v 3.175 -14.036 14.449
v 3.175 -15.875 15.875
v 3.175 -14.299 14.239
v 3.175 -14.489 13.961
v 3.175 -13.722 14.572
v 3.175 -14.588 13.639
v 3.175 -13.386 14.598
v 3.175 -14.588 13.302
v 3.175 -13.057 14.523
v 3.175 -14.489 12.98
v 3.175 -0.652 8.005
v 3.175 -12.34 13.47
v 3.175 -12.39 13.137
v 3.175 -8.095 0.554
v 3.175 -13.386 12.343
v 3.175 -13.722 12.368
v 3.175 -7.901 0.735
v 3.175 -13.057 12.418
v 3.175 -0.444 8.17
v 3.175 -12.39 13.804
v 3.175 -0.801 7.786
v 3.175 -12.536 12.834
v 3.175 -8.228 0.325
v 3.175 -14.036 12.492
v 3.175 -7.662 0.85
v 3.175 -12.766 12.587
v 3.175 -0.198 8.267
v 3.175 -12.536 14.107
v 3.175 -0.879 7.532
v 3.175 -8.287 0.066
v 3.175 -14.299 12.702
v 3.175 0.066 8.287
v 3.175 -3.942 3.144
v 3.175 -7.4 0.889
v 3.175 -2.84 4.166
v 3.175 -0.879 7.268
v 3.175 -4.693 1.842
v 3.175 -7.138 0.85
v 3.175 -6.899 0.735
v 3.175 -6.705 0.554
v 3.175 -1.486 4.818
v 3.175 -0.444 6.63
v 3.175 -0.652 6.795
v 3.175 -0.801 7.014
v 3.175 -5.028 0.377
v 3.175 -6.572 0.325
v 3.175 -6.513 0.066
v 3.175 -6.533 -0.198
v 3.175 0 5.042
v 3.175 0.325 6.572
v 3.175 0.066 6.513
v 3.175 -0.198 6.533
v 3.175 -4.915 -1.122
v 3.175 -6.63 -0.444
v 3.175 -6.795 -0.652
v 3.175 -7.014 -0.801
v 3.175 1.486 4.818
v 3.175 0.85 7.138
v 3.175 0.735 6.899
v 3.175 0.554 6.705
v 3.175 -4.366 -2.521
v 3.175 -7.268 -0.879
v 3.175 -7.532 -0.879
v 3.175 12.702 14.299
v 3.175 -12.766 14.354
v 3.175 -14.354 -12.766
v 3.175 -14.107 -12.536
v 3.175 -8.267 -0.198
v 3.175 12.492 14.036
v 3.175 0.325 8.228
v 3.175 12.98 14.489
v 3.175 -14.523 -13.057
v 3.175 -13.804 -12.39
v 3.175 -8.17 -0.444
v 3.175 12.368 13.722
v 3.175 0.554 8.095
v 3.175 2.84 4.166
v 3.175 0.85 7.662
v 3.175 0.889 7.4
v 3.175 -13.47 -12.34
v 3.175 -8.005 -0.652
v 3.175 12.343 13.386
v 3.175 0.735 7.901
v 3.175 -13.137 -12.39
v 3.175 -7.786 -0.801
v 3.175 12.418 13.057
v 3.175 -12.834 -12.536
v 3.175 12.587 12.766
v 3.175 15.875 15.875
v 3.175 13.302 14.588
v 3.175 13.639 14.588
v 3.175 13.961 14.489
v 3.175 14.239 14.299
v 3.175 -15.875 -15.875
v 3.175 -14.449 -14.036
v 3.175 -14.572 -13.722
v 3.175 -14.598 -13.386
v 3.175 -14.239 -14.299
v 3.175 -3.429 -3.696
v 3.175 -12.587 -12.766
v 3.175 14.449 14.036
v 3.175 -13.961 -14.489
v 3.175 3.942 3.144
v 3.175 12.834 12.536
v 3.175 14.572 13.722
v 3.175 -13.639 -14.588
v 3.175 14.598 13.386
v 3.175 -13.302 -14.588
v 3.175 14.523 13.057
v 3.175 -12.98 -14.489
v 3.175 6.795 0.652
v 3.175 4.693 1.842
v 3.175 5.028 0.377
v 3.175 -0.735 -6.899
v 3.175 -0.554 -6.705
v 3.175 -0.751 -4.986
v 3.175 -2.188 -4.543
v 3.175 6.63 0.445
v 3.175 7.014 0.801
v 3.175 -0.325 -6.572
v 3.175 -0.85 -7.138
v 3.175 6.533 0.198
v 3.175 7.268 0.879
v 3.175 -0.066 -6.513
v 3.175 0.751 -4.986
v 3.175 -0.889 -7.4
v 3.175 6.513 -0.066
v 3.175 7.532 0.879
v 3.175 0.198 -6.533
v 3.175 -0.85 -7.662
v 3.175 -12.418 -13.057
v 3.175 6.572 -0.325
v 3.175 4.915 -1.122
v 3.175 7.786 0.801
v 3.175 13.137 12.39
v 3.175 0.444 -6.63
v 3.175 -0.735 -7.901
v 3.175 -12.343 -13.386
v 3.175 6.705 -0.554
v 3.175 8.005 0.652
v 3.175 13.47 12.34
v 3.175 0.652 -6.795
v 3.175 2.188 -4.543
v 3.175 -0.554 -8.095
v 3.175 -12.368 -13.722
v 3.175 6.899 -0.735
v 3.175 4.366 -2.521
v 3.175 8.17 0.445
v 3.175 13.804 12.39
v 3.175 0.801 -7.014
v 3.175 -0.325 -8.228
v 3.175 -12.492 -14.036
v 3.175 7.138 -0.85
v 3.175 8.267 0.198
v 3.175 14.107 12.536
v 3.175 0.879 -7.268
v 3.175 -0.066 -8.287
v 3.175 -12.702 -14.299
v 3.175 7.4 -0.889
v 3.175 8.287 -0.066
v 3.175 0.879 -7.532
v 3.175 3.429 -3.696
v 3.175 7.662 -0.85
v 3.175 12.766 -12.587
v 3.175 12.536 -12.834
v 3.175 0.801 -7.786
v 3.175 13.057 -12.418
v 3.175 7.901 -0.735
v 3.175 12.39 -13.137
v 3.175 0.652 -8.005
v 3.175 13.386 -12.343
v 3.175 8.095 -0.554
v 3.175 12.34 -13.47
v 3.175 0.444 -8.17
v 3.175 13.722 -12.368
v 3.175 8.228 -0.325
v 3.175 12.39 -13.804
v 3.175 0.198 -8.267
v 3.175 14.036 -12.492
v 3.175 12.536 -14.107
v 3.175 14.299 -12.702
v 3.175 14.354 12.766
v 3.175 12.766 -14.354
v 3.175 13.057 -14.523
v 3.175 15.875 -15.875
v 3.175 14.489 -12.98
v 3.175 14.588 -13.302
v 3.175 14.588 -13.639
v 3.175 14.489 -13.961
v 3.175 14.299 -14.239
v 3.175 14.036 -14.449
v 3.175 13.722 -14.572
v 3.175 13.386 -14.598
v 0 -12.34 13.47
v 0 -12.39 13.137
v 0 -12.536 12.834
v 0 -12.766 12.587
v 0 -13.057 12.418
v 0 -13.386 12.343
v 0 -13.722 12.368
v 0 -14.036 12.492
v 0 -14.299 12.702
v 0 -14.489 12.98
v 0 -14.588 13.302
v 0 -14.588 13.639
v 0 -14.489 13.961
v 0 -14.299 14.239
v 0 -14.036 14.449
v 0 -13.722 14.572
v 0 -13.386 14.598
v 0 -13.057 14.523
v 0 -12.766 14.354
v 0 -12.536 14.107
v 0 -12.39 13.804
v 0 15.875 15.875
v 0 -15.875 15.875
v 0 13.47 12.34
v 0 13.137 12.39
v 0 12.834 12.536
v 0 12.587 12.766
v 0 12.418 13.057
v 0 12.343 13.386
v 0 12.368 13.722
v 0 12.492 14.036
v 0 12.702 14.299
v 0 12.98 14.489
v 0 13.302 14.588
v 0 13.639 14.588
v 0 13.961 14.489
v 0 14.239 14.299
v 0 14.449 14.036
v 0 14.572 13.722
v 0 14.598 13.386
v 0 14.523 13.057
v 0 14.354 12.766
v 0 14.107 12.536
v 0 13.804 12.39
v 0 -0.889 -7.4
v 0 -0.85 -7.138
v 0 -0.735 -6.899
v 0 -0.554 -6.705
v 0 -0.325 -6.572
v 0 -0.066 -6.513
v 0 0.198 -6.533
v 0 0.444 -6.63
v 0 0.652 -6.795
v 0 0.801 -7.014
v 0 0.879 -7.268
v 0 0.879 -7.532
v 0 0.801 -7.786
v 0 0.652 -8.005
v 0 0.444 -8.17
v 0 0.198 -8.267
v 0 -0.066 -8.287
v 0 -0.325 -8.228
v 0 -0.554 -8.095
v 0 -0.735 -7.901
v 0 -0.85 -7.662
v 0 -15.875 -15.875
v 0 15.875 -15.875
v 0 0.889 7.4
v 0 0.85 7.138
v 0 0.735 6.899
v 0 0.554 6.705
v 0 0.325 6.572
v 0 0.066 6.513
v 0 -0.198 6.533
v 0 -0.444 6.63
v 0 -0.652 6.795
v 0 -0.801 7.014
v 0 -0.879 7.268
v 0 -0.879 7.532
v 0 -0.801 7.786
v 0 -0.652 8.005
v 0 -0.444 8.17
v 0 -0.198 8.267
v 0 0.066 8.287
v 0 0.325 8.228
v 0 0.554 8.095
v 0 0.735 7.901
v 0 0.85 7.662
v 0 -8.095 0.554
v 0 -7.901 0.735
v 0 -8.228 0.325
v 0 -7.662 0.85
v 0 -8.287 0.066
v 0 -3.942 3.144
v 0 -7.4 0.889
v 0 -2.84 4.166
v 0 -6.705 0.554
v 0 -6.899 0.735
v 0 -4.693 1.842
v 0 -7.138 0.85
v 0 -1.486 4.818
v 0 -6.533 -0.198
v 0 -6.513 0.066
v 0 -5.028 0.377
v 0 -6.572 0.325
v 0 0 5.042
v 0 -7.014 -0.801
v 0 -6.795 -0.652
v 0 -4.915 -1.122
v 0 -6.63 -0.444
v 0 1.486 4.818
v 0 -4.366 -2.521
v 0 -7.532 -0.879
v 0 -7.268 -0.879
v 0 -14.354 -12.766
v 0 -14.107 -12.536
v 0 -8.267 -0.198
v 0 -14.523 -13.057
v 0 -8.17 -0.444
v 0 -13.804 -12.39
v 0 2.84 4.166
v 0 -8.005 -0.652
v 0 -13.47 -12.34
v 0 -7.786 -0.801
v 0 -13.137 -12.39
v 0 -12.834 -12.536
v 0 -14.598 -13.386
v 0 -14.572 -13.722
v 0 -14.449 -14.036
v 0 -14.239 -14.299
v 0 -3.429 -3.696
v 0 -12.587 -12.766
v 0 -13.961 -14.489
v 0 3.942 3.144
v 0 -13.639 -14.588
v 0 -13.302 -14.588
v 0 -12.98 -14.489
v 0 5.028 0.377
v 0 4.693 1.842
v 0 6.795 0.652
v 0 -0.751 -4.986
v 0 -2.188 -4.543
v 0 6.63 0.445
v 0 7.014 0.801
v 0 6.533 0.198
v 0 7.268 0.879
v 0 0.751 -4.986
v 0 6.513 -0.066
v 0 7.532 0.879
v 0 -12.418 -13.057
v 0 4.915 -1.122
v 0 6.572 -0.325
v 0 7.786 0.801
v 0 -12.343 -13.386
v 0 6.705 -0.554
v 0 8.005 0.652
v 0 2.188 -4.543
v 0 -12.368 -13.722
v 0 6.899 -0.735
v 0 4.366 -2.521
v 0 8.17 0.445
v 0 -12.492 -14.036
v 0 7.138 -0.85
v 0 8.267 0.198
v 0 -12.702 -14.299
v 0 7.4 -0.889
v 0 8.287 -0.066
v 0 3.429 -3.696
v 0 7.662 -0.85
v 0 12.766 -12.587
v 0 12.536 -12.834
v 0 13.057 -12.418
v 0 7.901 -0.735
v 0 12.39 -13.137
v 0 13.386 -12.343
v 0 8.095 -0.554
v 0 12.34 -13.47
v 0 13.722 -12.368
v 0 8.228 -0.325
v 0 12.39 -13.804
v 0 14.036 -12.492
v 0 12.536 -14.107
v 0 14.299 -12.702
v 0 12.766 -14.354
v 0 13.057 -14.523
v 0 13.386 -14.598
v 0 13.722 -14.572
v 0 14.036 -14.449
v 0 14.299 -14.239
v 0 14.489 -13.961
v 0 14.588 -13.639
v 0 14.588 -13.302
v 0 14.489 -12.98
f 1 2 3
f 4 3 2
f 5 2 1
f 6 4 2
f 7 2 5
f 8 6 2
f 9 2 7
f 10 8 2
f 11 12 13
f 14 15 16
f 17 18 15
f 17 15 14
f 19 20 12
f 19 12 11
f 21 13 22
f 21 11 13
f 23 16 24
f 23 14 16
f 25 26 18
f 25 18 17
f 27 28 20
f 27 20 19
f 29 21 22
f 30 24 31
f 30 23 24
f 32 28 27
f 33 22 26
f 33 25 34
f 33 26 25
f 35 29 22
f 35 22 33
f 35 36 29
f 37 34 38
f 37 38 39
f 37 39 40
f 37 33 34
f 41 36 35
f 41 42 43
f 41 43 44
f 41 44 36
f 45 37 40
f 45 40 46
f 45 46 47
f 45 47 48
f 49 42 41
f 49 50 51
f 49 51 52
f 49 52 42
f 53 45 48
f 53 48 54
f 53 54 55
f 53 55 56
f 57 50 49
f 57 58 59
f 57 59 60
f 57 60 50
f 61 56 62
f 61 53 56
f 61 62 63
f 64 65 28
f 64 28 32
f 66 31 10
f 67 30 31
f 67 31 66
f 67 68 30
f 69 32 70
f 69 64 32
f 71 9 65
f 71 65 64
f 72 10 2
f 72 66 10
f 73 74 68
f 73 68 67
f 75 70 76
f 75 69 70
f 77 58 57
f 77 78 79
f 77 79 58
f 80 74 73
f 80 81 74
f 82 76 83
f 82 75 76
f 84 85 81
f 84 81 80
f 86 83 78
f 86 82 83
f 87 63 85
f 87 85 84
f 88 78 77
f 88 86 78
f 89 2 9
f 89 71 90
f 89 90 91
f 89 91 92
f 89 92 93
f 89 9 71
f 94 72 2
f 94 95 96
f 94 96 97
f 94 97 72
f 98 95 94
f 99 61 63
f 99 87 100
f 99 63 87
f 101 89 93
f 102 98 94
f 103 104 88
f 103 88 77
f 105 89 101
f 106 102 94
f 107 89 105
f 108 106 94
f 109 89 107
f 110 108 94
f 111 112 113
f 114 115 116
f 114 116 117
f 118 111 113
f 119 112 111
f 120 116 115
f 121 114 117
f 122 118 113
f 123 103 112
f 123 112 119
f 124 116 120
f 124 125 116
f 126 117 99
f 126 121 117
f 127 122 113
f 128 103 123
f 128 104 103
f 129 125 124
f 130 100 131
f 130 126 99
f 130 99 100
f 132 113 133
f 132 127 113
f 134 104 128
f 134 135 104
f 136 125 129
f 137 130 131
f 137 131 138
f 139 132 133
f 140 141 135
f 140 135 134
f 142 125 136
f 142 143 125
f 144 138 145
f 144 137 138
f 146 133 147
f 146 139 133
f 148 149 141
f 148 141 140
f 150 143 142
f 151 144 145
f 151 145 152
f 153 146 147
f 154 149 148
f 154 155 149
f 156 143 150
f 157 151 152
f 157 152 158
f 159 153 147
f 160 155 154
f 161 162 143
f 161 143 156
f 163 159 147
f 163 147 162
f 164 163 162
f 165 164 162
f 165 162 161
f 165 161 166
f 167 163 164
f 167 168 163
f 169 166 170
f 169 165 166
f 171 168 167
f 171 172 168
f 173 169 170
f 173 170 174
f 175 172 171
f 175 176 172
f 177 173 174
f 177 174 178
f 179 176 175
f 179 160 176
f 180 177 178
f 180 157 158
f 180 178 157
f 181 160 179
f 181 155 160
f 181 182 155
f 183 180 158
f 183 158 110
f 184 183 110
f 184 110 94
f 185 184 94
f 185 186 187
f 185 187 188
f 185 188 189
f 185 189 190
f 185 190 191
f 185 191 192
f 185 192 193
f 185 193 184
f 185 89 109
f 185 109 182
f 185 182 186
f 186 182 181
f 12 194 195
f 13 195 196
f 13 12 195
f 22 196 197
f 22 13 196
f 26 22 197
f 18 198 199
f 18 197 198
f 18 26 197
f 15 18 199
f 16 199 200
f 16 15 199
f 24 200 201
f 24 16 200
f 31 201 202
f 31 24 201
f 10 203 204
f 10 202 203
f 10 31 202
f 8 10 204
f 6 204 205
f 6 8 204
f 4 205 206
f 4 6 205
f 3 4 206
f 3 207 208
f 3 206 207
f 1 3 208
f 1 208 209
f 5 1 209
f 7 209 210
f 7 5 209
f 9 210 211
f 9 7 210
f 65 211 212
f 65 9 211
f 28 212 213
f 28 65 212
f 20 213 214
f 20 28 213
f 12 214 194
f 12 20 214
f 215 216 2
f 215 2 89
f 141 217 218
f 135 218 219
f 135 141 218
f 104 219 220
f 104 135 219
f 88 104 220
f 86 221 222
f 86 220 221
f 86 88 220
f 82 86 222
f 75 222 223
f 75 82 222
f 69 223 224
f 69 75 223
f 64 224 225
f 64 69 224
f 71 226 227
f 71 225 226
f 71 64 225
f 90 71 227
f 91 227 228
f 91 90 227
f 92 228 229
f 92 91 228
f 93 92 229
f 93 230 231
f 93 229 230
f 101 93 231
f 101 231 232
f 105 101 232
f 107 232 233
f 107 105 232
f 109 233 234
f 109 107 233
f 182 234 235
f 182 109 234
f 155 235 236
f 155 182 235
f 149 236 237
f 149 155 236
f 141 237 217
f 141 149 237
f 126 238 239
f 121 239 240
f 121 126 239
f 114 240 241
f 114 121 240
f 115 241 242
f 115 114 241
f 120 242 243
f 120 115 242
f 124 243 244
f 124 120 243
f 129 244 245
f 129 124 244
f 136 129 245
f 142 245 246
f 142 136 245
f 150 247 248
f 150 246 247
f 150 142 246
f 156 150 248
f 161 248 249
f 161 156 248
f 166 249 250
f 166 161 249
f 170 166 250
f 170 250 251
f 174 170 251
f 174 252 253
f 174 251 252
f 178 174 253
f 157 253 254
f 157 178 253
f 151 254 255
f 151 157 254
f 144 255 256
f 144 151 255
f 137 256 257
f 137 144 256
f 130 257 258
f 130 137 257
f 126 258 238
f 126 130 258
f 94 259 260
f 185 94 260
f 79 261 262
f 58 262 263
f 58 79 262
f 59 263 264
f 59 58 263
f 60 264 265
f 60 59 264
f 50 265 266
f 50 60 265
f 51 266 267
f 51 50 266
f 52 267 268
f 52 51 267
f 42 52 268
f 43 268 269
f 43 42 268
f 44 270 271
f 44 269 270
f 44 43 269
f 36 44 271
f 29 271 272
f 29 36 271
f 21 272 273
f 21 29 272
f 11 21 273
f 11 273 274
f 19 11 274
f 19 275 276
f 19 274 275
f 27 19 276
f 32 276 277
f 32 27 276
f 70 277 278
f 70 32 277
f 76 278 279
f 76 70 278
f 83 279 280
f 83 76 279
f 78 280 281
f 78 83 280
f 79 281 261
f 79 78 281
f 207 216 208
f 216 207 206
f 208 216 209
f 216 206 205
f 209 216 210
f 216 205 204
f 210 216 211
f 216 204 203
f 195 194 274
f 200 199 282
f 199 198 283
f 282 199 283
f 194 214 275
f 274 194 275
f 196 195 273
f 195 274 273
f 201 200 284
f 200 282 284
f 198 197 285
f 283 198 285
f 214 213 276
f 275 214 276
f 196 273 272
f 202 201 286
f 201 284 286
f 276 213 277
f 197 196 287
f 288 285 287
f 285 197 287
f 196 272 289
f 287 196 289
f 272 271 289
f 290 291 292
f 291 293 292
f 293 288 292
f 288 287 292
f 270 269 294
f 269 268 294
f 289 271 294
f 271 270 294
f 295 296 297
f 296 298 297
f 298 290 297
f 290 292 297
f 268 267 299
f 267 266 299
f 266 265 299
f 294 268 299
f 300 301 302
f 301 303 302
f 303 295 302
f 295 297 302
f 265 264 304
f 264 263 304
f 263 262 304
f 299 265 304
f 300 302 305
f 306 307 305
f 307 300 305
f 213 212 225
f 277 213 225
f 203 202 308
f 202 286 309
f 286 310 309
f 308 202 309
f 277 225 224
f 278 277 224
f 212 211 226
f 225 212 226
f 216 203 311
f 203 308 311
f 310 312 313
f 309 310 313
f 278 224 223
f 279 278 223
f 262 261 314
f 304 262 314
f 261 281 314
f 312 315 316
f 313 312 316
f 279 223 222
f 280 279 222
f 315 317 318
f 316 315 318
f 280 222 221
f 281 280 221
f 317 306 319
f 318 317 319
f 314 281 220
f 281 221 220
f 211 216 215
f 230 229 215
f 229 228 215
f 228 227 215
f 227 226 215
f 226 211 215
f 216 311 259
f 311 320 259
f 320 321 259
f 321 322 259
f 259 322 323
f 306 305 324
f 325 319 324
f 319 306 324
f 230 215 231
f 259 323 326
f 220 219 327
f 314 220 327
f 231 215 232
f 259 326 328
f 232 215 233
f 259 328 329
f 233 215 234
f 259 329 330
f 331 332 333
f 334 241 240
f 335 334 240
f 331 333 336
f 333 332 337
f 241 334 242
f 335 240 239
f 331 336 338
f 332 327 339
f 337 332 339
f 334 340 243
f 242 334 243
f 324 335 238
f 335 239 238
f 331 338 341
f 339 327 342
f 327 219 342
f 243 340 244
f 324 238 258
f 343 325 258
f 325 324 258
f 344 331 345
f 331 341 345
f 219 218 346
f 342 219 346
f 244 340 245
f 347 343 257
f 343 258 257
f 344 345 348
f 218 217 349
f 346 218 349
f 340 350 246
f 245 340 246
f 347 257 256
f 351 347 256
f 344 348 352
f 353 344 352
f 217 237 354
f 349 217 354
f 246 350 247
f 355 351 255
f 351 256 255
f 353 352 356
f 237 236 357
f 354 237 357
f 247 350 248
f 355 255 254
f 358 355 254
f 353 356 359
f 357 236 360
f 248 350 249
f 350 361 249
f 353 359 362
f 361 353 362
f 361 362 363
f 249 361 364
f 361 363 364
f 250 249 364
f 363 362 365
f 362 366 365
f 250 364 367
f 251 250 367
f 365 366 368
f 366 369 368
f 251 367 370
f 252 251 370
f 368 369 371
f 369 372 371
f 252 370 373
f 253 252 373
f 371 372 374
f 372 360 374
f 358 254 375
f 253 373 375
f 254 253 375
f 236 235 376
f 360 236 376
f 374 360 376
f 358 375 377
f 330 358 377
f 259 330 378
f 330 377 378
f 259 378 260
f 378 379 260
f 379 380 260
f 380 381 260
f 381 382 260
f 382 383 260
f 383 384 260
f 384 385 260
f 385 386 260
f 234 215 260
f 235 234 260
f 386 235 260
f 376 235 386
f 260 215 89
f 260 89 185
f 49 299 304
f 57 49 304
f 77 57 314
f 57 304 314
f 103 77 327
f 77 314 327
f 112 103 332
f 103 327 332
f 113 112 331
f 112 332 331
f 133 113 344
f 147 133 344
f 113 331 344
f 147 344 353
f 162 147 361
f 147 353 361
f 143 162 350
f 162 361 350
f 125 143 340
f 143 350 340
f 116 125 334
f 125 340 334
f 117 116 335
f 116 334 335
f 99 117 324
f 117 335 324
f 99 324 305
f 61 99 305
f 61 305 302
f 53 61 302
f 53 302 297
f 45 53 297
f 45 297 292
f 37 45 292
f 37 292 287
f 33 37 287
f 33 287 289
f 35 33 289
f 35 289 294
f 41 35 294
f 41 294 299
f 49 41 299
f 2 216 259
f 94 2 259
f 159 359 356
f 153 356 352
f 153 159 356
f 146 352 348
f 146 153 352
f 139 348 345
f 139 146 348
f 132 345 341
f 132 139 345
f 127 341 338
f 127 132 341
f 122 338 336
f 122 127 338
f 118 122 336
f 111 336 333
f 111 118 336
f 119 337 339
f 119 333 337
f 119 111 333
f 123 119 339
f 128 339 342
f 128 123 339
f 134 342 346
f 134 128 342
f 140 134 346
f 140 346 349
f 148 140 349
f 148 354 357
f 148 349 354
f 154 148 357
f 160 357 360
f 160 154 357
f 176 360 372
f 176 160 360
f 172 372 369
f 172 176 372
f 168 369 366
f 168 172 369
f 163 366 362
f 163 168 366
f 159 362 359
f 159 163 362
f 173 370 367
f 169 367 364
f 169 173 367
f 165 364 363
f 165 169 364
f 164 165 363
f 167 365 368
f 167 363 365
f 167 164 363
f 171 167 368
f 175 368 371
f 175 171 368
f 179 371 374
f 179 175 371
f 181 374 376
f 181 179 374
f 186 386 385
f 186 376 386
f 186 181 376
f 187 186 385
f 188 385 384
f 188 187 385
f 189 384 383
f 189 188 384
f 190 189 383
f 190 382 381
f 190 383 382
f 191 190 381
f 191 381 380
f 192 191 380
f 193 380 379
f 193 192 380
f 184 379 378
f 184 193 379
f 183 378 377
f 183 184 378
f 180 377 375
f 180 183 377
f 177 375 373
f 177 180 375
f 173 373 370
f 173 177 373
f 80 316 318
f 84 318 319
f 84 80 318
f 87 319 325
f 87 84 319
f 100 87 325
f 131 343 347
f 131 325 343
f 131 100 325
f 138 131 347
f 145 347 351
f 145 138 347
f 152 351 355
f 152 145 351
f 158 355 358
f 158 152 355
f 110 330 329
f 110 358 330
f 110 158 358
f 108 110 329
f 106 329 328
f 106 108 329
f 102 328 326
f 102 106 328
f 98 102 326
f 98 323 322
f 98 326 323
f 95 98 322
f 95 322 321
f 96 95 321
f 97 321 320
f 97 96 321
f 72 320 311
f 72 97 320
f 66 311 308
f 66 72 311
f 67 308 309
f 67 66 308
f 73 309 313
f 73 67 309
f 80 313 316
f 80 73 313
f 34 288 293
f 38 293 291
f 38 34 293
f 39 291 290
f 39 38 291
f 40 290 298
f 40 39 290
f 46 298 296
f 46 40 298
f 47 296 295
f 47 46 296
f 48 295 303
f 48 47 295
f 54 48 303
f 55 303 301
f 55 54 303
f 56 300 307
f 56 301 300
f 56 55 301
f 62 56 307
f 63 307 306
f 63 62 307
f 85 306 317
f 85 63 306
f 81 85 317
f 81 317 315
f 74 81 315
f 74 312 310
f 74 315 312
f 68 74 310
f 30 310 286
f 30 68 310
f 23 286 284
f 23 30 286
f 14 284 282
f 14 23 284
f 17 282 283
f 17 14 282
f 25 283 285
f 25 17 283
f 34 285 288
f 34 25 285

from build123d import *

# Parameters (mm, degrees)
SKETCH1_W                    = 31.75
SKETCH1_H                    = 31.75
BOSS_EXTRUDE1_DEPTH          = 3.175
X_0_397_DIAMETER_HOLE1_D     = 10.0838
X_0_397_DIAMETER_HOLE1_DEPTH = 12.7
X_0_397_DIAMETER_HOLE1_TIP   = 3.029479155
CIRPATTERN1_COUNT            = 4
CIRPATTERN2_COUNT            = 4


with BuildPart() as part:
    # Sketch1 → Boss-Extrude1 (new body)
    with BuildSketch(Plane(origin=(0, 0, 0), x_dir=(0, 0, -1), z_dir=(1, 0, 0))):
        Rectangle(SKETCH1_W, SKETCH1_H)
    extrude(amount=BOSS_EXTRUDE1_DEPTH)

    # X (0.397) Diameter Hole1
    with Locations(Plane(origin=(3.175, 0, 0), x_dir=(0, 0, -1), z_dir=(1, 0, 0))):
        with Locations((0, 0)):
            Hole(X_0_397_DIAMETER_HOLE1_D / 2, depth=X_0_397_DIAMETER_HOLE1_DEPTH)
            with Locations((0, 0, -(X_0_397_DIAMETER_HOLE1_DEPTH + X_0_397_DIAMETER_HOLE1_TIP / 2))):  # 118° drill point
                Cone(0, X_0_397_DIAMETER_HOLE1_D / 2, X_0_397_DIAMETER_HOLE1_TIP, mode=Mode.SUBTRACT)

    # Sketch4 → #2-56 Tapped Hole1 (revolve, cut)
    with BuildSketch(Plane(origin=(3.175, 7.4, 0), x_dir=(0, 0, -1), z_dir=(0, 1, 0))):
        Polygon((0, 0), (0, 7.13816509), (0.889, 6.604), (0.889, 0), align=None)
    f_2_56_tapped_hole1 = revolve(axis=Axis((9.525, 7.4, 0), (-1, 0, 0)), mode=Mode.SUBTRACT)

    # CirPattern1: #2-56 Tapped Hole1 ×4 about axis
    cirpattern1_axis = Axis((0, 0, 0), (1, 0, 0))
    for i in range(1, CIRPATTERN1_COUNT):
        add(f_2_56_tapped_hole1.rotate(cirpattern1_axis, i * 360 / CIRPATTERN1_COUNT), mode=Mode.SUBTRACT)

    # Sketch6 → #4-40 Tapped Hole1 (revolve, cut)
    with BuildSketch(Plane(origin=(3.175, 13.470384182, 13.470384182), x_dir=(0, 0, -1), z_dir=(0, 1, 0))):
        Polygon((0, 0), (0, 9.569152758), (1.1303, 8.89), (1.1303, 0), align=None)
    f_4_40_tapped_hole1 = revolve(axis=Axis((9.525, 13.470384182, 13.470384182), (-1, 0, 0)), mode=Mode.SUBTRACT)

    # CirPattern2: #4-40 Tapped Hole1 ×4 about axis
    cirpattern2_axis = Axis((0, 0, 0), (1, 0, 0))
    for i in range(1, CIRPATTERN2_COUNT):
        add(f_4_40_tapped_hole1.rotate(cirpattern2_axis, i * 360 / CIRPATTERN2_COUNT), mode=Mode.SUBTRACT)


solid = part.part
